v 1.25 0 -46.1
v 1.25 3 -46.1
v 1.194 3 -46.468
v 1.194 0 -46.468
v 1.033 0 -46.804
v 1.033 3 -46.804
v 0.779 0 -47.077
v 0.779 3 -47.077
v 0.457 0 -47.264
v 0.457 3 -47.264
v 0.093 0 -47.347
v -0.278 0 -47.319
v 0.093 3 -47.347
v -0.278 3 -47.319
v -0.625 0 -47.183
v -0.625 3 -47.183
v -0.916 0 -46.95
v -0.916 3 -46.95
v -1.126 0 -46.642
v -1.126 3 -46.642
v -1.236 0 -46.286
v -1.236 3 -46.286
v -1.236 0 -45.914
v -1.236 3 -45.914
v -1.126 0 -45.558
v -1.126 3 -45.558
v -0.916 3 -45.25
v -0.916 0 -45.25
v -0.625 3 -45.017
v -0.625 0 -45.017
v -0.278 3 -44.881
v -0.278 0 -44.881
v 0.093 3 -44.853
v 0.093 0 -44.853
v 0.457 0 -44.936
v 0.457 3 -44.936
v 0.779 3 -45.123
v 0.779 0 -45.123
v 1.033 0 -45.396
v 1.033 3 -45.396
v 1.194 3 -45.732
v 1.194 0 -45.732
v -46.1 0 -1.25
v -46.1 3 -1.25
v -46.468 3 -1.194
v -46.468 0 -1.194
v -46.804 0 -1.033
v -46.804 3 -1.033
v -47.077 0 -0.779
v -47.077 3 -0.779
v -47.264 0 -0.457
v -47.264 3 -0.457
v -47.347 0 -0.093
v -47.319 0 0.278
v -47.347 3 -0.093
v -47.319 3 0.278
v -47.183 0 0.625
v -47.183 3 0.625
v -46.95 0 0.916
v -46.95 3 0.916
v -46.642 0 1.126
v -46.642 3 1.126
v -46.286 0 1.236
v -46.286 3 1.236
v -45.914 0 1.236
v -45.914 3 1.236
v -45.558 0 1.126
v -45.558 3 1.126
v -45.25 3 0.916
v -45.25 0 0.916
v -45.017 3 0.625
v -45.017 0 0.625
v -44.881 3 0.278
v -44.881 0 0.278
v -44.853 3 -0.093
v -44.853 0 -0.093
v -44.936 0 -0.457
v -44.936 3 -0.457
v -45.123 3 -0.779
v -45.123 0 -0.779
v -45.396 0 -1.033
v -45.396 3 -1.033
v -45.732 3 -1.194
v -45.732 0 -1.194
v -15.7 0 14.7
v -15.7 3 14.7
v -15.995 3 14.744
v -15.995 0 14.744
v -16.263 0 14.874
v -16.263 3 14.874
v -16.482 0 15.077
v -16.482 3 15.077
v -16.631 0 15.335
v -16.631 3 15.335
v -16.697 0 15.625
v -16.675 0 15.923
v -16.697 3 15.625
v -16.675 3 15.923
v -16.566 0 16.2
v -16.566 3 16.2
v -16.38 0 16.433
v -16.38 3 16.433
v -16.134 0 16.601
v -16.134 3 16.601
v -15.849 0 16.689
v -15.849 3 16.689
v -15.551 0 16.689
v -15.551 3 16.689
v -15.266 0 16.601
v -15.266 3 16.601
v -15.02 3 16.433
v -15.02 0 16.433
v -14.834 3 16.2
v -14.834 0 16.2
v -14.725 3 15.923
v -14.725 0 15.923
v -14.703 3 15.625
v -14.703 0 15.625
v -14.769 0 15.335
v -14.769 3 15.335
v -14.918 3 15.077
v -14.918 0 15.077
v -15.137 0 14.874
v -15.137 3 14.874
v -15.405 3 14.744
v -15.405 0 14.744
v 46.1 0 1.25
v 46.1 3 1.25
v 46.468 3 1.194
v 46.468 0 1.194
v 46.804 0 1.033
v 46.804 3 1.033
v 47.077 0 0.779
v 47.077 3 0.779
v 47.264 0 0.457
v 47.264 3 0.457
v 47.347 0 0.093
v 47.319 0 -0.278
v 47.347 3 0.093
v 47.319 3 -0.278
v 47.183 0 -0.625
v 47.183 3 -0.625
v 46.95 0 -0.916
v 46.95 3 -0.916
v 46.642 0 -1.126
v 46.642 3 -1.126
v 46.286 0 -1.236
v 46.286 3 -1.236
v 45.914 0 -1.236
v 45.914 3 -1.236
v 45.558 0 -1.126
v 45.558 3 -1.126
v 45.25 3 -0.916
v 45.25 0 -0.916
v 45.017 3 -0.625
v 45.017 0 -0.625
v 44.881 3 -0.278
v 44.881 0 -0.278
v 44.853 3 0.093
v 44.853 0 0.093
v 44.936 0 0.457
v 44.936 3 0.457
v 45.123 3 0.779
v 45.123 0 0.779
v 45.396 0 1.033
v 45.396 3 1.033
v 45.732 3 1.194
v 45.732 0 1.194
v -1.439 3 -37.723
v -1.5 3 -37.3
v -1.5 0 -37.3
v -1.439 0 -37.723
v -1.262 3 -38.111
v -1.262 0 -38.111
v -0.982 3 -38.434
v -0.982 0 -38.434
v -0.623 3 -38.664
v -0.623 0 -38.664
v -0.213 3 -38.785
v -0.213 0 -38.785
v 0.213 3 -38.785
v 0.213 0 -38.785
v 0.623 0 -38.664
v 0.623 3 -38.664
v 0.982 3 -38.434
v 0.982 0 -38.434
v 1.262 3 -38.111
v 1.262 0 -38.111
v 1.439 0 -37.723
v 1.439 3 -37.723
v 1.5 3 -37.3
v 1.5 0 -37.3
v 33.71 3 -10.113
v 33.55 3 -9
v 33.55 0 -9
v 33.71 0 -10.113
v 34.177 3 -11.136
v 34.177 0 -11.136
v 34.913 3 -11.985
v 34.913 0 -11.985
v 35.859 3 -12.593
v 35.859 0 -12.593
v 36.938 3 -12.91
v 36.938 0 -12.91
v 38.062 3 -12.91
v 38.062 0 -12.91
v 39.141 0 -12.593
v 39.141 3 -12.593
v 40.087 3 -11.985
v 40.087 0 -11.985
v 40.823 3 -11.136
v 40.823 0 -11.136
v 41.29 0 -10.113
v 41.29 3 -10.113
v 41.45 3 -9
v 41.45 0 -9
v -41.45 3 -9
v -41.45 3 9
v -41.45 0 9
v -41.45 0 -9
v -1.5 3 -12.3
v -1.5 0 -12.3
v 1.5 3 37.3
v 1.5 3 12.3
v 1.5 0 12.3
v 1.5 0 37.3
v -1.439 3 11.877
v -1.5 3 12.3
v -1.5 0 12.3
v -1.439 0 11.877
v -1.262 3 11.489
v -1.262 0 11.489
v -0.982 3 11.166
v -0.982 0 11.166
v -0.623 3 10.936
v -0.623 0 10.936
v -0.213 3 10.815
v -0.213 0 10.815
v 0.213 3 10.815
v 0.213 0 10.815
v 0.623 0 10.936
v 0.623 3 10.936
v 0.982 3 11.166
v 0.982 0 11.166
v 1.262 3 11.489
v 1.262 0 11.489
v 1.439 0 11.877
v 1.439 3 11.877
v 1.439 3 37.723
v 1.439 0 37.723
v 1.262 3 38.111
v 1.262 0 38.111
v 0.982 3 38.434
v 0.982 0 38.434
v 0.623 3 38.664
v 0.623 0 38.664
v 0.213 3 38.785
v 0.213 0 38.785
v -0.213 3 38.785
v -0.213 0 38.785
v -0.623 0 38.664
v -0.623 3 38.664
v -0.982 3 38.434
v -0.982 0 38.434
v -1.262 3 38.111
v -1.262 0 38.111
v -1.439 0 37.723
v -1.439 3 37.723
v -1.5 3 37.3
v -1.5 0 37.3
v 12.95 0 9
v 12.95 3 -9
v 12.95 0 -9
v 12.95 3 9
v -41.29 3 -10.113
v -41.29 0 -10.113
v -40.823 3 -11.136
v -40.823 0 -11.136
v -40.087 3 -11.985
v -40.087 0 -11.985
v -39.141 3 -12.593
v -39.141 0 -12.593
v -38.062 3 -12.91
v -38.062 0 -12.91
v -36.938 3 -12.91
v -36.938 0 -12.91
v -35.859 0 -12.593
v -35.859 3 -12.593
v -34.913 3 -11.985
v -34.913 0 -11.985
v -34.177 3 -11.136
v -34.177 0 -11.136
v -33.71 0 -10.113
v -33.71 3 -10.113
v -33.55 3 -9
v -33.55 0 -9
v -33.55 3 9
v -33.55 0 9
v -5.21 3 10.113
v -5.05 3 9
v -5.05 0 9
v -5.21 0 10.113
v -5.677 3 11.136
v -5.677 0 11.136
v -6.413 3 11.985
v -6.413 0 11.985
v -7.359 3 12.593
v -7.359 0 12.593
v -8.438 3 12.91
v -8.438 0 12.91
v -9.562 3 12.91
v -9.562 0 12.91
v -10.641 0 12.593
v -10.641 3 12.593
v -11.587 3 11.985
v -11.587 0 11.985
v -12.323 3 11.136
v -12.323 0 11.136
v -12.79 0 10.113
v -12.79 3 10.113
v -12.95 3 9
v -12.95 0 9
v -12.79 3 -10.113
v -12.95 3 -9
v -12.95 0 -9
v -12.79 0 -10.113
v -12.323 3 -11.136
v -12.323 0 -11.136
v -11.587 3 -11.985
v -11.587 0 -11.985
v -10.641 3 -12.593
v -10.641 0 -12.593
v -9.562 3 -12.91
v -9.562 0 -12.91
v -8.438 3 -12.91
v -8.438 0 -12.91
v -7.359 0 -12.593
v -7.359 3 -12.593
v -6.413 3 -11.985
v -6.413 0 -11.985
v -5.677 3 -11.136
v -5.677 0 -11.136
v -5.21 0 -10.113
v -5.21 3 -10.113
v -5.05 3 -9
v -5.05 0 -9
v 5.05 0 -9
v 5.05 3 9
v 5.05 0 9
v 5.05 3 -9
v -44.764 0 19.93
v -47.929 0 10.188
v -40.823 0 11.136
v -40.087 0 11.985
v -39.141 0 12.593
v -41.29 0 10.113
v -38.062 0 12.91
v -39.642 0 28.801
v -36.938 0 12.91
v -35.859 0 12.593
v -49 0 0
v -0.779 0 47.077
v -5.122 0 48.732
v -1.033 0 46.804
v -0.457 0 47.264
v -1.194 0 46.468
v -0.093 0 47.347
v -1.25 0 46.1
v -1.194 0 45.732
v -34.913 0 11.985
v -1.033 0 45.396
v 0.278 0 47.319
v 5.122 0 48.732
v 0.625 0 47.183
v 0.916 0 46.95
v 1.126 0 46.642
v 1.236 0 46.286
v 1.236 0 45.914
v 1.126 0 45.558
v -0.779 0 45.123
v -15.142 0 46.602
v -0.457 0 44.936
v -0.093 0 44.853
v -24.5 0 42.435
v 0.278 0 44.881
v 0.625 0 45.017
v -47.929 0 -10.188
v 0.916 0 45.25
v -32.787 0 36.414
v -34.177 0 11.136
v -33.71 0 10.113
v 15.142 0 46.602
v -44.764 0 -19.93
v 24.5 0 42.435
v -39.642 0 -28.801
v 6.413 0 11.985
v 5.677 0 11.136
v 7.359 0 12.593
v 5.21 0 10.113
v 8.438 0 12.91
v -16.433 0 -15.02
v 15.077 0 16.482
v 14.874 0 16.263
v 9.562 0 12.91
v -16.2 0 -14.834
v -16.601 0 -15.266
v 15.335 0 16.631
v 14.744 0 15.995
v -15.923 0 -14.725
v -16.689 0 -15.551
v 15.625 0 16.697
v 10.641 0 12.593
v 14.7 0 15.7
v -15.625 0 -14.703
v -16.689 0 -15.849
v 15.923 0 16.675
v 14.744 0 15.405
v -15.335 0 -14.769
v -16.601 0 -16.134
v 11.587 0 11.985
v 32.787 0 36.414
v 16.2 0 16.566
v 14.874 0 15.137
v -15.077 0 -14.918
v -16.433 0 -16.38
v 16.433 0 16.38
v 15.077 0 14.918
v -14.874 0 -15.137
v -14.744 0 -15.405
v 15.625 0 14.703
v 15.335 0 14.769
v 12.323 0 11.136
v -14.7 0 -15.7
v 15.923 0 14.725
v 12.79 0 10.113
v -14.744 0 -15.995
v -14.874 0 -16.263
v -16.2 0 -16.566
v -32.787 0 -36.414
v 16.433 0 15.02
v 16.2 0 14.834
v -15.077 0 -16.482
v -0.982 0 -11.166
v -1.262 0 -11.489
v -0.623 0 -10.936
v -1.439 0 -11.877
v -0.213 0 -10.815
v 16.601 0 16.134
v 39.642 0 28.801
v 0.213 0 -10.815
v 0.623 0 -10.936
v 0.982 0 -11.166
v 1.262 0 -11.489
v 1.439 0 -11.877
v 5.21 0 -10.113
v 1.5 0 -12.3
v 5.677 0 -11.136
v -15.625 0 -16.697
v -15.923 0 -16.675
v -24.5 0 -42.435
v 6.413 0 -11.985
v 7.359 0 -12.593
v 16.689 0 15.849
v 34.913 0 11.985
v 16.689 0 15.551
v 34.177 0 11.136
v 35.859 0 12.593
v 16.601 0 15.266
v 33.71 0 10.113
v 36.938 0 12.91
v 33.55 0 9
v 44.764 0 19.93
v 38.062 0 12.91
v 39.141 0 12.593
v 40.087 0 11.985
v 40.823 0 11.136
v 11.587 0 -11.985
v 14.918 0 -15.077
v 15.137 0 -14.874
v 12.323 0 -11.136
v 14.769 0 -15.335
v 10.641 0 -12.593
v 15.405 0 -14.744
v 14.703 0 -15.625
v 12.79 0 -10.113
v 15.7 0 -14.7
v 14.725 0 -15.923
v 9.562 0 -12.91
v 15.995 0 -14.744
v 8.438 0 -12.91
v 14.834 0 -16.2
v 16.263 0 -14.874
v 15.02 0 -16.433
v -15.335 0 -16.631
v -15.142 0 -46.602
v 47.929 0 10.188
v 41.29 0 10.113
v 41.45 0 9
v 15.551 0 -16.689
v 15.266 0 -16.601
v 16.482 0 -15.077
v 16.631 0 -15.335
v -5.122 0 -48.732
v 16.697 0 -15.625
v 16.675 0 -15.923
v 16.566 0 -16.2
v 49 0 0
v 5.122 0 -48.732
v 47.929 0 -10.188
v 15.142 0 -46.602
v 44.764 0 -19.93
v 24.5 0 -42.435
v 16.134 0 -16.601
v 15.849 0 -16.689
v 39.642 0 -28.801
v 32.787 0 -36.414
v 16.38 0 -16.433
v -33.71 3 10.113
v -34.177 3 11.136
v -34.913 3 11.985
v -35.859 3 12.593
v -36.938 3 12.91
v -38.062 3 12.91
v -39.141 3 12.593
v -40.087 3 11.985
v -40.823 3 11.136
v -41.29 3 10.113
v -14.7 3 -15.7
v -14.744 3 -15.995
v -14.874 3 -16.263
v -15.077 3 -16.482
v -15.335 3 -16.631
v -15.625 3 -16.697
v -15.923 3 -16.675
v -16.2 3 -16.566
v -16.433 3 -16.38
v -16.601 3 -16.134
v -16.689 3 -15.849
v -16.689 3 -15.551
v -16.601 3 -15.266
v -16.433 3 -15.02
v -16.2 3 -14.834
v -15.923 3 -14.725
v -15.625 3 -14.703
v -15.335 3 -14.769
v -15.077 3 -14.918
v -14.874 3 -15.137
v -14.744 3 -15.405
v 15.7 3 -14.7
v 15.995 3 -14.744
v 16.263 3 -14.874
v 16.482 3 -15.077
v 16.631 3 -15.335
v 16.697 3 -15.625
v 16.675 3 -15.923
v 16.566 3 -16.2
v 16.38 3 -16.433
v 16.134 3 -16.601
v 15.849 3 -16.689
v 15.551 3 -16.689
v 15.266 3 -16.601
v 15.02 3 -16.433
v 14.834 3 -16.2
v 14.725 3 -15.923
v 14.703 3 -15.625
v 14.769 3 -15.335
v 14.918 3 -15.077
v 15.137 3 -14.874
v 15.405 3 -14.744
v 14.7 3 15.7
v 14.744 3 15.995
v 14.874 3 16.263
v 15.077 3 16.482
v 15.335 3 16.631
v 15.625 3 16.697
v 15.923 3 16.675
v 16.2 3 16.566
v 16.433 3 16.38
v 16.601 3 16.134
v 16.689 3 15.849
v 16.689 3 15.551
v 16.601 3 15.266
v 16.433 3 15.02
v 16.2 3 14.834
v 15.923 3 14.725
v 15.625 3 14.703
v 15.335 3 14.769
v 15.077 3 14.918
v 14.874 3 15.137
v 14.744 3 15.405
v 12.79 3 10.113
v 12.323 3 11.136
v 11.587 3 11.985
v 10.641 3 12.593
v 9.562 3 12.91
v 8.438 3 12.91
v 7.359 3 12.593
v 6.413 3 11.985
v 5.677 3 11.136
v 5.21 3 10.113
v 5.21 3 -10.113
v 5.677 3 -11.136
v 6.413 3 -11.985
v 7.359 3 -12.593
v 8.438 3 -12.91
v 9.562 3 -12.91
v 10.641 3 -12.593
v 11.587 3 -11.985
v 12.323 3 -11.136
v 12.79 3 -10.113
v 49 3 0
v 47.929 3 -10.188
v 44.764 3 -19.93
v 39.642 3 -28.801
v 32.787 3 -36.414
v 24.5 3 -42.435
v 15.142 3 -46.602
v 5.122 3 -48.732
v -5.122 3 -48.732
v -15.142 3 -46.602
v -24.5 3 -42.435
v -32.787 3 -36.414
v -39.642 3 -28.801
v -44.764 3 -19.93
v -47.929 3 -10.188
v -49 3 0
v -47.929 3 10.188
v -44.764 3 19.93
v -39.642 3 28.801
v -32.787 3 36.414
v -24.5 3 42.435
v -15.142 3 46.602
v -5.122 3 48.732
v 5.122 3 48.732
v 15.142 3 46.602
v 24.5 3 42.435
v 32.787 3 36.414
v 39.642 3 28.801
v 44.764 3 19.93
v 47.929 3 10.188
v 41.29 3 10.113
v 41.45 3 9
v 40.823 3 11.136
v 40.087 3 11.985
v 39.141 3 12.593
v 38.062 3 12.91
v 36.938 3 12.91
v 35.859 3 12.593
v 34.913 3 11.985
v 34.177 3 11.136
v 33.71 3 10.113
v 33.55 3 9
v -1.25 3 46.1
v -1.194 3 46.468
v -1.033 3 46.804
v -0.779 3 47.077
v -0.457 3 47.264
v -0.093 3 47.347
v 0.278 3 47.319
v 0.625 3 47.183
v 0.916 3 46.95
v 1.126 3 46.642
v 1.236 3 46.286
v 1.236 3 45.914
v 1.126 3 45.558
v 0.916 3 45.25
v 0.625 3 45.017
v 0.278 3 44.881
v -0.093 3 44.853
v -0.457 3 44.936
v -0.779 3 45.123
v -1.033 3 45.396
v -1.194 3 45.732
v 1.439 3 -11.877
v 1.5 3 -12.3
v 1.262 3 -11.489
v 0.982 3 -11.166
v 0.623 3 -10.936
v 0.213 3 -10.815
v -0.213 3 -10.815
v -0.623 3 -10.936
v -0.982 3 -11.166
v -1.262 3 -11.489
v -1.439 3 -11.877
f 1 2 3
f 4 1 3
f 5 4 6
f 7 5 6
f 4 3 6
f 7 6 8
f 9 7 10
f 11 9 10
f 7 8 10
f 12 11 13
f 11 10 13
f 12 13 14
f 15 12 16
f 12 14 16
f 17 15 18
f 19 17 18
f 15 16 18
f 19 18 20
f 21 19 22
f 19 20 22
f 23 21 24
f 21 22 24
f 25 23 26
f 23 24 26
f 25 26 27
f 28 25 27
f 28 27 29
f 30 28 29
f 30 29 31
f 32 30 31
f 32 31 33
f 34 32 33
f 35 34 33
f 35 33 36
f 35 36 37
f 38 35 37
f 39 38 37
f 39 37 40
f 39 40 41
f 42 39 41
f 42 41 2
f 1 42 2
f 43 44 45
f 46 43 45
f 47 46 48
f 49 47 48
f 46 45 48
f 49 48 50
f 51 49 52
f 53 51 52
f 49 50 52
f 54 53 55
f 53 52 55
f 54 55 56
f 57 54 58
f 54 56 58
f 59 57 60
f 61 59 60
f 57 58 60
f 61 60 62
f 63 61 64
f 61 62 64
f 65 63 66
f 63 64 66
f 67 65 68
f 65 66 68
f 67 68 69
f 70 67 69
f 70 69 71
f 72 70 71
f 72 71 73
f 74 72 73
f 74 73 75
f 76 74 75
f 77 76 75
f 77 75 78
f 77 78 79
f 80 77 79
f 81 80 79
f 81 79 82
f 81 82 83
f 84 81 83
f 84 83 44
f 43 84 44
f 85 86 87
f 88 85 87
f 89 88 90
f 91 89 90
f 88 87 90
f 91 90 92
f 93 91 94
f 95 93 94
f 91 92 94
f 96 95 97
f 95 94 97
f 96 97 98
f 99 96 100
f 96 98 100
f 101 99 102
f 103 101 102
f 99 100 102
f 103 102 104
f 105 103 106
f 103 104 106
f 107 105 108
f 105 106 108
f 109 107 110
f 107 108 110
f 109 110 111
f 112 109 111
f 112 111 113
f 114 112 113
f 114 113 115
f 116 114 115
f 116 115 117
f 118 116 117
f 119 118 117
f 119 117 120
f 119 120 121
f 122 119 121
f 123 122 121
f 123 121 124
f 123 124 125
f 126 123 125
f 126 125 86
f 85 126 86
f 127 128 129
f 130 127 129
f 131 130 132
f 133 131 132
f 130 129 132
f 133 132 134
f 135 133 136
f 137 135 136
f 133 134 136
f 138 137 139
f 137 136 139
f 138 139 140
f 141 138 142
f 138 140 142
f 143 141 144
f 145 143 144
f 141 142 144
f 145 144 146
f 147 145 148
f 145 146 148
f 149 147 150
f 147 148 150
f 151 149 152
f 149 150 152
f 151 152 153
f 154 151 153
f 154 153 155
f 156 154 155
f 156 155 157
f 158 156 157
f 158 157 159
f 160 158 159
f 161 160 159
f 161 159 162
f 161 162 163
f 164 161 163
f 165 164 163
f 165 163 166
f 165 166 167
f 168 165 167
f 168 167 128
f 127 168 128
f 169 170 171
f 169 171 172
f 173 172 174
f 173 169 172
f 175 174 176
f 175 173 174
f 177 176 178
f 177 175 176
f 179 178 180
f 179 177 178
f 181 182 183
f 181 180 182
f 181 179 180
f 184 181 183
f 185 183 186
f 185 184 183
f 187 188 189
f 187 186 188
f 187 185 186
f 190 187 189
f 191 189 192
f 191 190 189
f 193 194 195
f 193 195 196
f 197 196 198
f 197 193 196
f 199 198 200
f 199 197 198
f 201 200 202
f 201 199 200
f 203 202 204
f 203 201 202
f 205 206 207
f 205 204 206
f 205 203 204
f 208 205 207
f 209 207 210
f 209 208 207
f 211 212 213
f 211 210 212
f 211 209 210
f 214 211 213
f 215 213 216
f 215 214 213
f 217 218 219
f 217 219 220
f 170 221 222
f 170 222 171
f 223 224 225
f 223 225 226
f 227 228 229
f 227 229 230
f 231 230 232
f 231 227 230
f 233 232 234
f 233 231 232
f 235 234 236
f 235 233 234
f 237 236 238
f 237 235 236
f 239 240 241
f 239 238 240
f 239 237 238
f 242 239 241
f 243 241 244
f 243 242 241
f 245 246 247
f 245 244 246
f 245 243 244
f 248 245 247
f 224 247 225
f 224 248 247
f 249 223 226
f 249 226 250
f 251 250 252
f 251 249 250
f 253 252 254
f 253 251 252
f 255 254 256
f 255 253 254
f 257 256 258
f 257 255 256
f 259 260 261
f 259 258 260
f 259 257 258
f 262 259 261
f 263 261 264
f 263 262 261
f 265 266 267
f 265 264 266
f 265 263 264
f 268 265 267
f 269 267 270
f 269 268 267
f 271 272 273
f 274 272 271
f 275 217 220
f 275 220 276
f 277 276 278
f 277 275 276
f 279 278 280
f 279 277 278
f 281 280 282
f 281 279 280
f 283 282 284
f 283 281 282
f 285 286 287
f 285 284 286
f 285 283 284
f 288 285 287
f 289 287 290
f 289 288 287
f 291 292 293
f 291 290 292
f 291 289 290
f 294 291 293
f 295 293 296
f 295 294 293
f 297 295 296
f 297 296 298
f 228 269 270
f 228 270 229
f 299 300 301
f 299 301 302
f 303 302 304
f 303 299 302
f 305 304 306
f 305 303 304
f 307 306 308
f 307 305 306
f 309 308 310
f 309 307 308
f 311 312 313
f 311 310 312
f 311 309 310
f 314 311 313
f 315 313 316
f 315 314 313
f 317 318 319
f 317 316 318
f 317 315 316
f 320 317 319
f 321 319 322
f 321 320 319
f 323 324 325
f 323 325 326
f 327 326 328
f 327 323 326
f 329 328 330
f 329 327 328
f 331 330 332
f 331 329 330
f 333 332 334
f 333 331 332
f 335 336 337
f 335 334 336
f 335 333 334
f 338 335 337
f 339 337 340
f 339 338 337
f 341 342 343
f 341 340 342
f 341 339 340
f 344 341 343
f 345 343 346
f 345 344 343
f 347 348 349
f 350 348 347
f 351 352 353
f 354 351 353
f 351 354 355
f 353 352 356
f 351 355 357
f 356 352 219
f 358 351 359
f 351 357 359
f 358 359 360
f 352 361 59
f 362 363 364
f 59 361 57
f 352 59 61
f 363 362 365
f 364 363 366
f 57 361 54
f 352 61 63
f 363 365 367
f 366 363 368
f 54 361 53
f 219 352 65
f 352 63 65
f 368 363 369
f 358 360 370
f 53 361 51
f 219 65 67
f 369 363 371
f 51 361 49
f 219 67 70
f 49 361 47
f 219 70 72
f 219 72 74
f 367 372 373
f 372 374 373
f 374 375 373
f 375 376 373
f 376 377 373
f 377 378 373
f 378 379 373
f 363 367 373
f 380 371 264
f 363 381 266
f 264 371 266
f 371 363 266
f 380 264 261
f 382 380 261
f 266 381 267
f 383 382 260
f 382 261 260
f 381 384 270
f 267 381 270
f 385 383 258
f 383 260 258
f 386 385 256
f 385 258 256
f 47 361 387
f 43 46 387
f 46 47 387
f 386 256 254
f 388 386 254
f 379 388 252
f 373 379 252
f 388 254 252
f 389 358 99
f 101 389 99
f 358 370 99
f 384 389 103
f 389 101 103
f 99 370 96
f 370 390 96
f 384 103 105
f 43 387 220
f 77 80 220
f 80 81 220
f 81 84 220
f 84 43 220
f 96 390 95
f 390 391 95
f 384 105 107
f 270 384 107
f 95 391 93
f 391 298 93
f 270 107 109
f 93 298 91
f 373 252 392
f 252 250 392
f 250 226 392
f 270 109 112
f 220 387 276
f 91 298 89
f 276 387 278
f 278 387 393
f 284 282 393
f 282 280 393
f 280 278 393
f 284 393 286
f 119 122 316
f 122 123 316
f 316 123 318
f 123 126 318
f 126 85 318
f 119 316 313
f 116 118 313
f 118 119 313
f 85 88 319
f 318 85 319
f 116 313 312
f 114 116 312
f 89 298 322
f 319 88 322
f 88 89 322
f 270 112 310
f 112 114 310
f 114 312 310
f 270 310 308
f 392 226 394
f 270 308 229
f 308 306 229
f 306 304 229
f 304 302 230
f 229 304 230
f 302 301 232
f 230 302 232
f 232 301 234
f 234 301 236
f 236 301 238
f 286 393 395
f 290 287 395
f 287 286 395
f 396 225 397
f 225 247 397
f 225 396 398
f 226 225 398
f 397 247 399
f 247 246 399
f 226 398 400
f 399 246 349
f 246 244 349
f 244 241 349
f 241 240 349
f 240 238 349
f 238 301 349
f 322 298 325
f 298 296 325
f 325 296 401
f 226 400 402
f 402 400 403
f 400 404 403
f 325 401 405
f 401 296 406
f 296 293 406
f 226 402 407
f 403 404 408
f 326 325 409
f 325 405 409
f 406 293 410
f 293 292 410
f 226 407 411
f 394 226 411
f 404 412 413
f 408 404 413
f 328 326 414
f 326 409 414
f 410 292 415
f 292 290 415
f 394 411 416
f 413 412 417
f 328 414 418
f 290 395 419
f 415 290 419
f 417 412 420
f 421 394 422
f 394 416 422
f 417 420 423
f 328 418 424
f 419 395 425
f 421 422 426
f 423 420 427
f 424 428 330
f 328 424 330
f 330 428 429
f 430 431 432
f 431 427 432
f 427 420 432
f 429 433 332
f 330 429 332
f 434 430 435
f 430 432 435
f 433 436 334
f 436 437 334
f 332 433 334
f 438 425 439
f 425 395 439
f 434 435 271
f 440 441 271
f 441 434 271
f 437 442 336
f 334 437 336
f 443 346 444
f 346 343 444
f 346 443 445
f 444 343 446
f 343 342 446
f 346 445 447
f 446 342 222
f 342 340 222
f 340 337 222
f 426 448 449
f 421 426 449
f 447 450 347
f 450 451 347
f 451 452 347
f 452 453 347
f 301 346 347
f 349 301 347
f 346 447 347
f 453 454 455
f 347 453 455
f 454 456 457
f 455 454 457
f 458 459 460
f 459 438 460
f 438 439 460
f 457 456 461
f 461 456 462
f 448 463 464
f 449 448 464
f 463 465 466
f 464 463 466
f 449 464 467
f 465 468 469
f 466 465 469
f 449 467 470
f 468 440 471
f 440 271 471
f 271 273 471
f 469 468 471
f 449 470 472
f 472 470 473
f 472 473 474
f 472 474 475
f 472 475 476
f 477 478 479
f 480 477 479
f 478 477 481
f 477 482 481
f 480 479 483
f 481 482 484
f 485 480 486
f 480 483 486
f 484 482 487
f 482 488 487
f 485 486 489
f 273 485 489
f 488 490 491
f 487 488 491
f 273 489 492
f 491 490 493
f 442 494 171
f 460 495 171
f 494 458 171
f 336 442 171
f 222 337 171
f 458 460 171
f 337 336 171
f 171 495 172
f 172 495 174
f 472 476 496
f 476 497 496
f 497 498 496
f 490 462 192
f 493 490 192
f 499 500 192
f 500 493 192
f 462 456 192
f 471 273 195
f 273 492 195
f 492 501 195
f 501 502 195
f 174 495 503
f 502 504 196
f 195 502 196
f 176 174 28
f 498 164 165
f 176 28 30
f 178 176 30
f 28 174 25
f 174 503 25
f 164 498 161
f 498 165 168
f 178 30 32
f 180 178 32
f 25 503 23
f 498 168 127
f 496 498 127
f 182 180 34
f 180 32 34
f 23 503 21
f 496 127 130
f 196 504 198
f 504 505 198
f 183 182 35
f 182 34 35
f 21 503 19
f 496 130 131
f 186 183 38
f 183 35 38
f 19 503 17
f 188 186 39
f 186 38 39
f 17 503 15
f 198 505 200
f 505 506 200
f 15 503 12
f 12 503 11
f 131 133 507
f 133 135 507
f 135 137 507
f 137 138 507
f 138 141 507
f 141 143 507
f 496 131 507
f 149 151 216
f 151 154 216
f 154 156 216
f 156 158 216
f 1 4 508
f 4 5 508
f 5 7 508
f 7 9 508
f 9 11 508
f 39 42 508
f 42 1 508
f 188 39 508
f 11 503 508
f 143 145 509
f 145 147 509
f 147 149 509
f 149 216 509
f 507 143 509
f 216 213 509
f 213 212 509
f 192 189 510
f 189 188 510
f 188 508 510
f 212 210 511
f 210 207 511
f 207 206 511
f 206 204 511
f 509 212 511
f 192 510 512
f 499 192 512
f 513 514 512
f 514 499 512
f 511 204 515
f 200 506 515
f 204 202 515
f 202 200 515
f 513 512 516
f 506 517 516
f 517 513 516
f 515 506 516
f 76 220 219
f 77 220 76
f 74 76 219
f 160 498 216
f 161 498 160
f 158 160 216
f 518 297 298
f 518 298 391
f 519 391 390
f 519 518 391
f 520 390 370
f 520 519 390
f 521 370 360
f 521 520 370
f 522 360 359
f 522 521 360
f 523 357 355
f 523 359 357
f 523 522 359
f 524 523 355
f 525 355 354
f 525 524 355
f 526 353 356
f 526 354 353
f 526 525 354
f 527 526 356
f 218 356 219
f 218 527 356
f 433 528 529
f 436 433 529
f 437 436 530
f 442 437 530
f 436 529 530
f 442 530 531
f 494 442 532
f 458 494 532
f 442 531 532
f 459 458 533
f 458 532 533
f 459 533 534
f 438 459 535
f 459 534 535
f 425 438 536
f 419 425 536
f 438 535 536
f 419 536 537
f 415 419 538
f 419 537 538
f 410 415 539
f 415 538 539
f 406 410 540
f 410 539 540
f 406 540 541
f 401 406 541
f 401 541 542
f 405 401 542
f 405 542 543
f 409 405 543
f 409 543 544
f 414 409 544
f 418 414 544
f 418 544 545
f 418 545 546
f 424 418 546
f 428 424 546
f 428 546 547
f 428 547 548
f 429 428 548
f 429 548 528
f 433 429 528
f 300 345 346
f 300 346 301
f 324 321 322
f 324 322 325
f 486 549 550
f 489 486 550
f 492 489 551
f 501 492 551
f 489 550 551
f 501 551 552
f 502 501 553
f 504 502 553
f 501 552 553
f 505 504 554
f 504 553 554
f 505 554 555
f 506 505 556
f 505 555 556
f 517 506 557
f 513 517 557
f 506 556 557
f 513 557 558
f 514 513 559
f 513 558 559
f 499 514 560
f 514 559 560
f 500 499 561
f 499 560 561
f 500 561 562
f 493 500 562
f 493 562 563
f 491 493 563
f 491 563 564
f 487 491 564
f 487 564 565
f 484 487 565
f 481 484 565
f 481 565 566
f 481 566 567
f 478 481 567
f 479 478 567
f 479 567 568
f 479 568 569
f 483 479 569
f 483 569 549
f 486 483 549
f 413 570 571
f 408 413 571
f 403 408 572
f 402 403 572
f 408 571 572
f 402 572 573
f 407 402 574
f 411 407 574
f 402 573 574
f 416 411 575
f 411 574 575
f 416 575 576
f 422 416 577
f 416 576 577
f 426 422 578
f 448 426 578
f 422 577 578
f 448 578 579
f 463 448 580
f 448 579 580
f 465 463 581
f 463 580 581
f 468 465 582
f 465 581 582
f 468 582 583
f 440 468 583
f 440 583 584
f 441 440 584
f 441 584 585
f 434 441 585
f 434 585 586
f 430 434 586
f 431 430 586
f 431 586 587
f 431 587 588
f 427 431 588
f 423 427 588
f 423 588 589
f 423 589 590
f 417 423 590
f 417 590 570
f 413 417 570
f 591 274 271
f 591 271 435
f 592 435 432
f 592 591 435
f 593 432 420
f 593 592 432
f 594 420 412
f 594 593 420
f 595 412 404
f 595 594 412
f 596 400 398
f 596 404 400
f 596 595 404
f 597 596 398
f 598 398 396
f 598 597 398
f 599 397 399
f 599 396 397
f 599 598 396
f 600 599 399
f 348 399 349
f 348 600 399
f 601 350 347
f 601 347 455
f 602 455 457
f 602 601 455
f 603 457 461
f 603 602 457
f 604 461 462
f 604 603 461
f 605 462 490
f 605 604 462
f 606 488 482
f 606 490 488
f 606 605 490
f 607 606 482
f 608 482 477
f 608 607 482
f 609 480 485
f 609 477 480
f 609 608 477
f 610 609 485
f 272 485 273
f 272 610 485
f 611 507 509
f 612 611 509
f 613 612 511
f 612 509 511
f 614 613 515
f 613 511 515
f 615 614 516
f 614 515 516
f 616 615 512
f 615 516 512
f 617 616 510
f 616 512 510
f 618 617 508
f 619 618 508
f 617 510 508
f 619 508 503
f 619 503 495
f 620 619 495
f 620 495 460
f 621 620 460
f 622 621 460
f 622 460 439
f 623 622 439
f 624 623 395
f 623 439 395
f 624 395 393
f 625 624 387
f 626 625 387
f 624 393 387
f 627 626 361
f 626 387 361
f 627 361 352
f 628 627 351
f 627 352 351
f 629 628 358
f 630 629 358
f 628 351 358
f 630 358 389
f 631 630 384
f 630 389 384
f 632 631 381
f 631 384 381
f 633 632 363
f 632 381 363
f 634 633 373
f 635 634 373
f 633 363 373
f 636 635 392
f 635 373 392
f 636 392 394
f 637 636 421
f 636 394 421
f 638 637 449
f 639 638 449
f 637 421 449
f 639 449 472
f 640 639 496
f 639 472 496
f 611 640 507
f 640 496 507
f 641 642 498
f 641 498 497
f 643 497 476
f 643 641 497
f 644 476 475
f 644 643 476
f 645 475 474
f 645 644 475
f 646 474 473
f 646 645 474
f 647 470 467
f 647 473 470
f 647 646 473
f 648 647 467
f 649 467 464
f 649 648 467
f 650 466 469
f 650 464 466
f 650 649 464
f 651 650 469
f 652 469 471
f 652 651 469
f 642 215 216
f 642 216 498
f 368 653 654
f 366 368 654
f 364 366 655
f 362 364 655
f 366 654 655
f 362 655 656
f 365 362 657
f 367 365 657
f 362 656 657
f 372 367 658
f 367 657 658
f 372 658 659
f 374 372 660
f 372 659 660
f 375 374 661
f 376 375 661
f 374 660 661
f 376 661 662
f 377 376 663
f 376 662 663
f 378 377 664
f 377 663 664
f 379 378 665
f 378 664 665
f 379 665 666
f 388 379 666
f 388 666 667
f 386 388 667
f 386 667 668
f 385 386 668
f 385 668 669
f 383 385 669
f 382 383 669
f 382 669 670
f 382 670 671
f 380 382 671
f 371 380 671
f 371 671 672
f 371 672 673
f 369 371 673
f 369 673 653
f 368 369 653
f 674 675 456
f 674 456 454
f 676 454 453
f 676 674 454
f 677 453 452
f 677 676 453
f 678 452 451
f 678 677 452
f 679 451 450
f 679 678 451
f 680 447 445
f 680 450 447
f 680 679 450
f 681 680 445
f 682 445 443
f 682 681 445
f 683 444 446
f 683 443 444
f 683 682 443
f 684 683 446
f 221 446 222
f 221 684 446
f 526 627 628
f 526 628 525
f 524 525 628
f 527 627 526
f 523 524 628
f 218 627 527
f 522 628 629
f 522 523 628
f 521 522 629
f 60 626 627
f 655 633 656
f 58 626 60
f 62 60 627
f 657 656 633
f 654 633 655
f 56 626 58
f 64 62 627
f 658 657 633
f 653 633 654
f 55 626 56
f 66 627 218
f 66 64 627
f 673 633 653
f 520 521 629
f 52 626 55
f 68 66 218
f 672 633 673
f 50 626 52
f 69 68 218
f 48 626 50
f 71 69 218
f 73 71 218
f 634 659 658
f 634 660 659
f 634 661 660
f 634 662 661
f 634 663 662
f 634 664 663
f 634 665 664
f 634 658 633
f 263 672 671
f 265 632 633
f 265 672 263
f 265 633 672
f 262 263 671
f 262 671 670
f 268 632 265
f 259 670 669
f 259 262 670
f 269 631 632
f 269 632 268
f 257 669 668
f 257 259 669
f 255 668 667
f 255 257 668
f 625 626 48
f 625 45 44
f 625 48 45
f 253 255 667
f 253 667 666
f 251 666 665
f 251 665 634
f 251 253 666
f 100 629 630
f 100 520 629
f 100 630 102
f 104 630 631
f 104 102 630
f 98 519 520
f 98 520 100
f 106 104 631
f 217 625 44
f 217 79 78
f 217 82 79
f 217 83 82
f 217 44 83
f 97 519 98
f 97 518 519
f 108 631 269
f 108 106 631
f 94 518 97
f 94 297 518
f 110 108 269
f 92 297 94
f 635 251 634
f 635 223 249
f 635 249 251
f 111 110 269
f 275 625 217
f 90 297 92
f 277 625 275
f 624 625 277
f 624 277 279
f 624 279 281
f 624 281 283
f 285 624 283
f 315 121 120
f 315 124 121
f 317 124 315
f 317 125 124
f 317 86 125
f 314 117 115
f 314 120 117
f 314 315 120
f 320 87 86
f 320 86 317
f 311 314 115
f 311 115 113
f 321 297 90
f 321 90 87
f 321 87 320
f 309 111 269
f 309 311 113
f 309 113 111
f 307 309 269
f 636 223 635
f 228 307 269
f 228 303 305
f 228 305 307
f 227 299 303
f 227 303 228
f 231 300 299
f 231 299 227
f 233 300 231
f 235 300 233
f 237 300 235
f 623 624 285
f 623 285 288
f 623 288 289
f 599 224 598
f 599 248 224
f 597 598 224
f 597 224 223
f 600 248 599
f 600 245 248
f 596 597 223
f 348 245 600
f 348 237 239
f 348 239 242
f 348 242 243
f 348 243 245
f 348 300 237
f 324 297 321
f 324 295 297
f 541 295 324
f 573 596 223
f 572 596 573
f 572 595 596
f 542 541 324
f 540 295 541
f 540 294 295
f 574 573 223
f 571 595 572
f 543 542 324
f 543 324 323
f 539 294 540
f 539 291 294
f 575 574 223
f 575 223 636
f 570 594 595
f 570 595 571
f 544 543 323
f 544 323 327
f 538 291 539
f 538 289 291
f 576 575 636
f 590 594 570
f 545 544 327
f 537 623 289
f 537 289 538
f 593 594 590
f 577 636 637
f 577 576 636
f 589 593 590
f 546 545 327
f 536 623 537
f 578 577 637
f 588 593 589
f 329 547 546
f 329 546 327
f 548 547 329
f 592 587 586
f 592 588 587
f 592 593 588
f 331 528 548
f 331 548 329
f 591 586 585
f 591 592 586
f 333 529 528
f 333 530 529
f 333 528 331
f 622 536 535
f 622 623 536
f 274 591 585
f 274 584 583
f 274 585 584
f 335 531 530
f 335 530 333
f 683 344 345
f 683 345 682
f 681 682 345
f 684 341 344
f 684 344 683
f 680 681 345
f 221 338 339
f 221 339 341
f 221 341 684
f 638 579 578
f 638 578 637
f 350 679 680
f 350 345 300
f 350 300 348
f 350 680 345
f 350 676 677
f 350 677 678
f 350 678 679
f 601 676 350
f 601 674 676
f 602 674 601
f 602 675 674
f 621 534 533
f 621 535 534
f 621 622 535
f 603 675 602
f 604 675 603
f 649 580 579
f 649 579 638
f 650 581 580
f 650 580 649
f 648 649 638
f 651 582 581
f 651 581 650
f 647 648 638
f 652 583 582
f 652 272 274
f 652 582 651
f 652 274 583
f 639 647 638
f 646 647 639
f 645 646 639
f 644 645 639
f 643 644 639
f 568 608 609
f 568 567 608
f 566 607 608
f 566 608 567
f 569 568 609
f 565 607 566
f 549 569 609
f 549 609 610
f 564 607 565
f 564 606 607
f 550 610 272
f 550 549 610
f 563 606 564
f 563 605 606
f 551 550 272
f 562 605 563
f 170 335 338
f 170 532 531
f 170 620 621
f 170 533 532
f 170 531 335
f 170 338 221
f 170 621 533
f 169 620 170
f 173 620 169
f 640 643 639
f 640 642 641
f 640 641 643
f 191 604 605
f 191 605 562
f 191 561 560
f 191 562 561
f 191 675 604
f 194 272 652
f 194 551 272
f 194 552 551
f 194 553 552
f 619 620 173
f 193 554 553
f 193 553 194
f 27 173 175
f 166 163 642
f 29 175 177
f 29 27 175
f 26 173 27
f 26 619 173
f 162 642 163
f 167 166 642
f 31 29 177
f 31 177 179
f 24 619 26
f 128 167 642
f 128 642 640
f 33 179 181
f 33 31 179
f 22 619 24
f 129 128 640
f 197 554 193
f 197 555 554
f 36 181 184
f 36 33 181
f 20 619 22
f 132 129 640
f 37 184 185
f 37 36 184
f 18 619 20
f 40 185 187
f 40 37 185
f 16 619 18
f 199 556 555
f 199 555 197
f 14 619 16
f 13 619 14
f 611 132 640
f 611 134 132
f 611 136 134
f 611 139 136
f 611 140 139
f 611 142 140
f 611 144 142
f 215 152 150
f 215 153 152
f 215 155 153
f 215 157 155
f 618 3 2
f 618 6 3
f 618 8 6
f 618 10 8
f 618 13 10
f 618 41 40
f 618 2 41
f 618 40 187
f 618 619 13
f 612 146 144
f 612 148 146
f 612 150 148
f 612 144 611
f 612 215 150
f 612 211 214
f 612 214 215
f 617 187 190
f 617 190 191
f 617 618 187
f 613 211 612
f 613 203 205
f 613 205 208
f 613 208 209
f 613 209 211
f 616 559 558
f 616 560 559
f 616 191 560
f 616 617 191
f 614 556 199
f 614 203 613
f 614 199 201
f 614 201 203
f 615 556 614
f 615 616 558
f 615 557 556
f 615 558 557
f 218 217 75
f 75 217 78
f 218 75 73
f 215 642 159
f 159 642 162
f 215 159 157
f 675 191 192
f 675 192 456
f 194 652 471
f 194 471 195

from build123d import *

# Parameters (mm, degrees)
SKETCH_1_R                      = 49
EXTRUDE_1_DEPTH                 = 3
CUT_EXTRUDE_1_DEPTH             = 4
PATTERN_CIRCULAR_2_COUNT        = 2
CUT_EXTRUDE_3_DEPTH             = 4
PATTERN_LINEAR_1_COUNT          = 2
PATTERN_LINEAR_1_PITCH          = 28.5
PATTERN_CIRCULAR_5_COUNT        = 2
PATTERN_CIRCULAR_5_COPY_1_DEPTH = 4
SKETCH_14_R                     = 1.25
CUT_EXTRUDE_4_DEPTH             = 4
PATTERN_CIRCULAR_6_COUNT        = 4
SKETCH_8_R                      = 1
CUT_EXTRUDE_5_DEPTH             = 4
PATTERN_CIRCULAR_7_COUNT        = 4


with BuildPart() as part:
    # 草图1 → 凸台-拉伸1 (new body)
    with BuildSketch(Plane(origin=(0, 0, 0), x_dir=(1, 0, 0), z_dir=(0, 1, 0))):
        Circle(SKETCH_1_R)
    extrude(amount=EXTRUDE_1_DEPTH)

    # 草图6 → 切除-拉伸1 (cut, through all)
    with BuildSketch(Plane(origin=(0, 3, 0), x_dir=(1, 0, 0), z_dir=(0, 1, 0))):
        with BuildLine():
            Line((-1.5, 12.3), (-1.5, 37.3))
            ThreePointArc((-1.5, 37.3), (0, 38.8), (1.5, 37.3))
            Line((1.5, 37.3), (1.5, 12.3))
            ThreePointArc((1.5, 12.3), (0, 10.8), (-1.5, 12.3))
        make_face()
    cut_extrude_1 = extrude(amount=-CUT_EXTRUDE_1_DEPTH, mode=Mode.SUBTRACT)

    # 阵列(圆周)2: 切除-拉伸1 ×2 about axis
    pattern_circular_2_axis = Axis((0, 0, 0), (0, 1, 0))
    for i in range(1, PATTERN_CIRCULAR_2_COUNT):
        add(cut_extrude_1.rotate(pattern_circular_2_axis, i * 360 / PATTERN_CIRCULAR_2_COUNT), mode=Mode.SUBTRACT)

    # 草图9 → 切除-拉伸3 (cut, through all)
    with BuildSketch(Plane(origin=(0, 3, 0), x_dir=(1, 0, 0), z_dir=(0, 1, 0))):
        with BuildLine():
            Line((-12.95, -9), (-12.95, 9))
            ThreePointArc((-12.95, 9), (-9, 12.95), (-5.05, 9))
            Line((-5.05, 9), (-5.05, -9))
            ThreePointArc((-5.05, -9), (-9, -12.95), (-12.95, -9))
        make_face()
    cut_extrude_3 = extrude(amount=-CUT_EXTRUDE_3_DEPTH, mode=Mode.SUBTRACT)

    # 阵列(线性)1: 切除-拉伸3 ×2
    with Locations(*[(-i * PATTERN_LINEAR_1_PITCH, 0, 0) for i in range(1, PATTERN_LINEAR_1_COUNT)]):
        add(cut_extrude_3, mode=Mode.SUBTRACT)

    # 阵列(圆周)5: 切除-拉伸3 ×2 about axis
    pattern_circular_5_axis = Axis((0, 0, 0), (0, 1, 0))
    for i in range(1, PATTERN_CIRCULAR_5_COUNT):
        add(cut_extrude_3.rotate(pattern_circular_5_axis, i * 360 / PATTERN_CIRCULAR_5_COUNT), mode=Mode.SUBTRACT)

    # 阵列(圆周)5 copy 1 sketch → 阵列(圆周)5 copy 1 (cut, through all)
    with BuildSketch(Plane(origin=(28.5, 3, 0), x_dir=(-1, 0, 0), z_dir=(0, 1, 0))):
        with BuildLine():
            Line((-12.95, -9), (-12.95, 9))
            ThreePointArc((-12.95, 9), (-9, 12.95), (-5.05, 9))
            Line((-5.05, 9), (-5.05, -9))
            ThreePointArc((-5.05, -9), (-9, -12.95), (-12.95, -9))
        make_face()
    extrude(amount=-PATTERN_CIRCULAR_5_COPY_1_DEPTH, mode=Mode.SUBTRACT)

    # 草图14 → 切除-拉伸4 (cut, through all)
    with BuildSketch(Plane(origin=(0, 3, 0), x_dir=(1, 0, 0), z_dir=(0, 1, 0))):
        with Locations((0, 46.1)):
            Circle(SKETCH_14_R)
    cut_extrude_4 = extrude(amount=-CUT_EXTRUDE_4_DEPTH, mode=Mode.SUBTRACT)

    # 阵列(圆周)6: 切除-拉伸4 ×4 about axis
    pattern_circular_6_axis = Axis((0, 0, 0), (0, 1, 0))
    for i in range(1, PATTERN_CIRCULAR_6_COUNT):
        add(cut_extrude_4.rotate(pattern_circular_6_axis, i * 360 / PATTERN_CIRCULAR_6_COUNT), mode=Mode.SUBTRACT)

    # 草图8 → 切除-拉伸5 (cut, through all)
    with BuildSketch(Plane(origin=(0, 3, 0), x_dir=(1, 0, 0), z_dir=(0, 1, 0))):
        with Locations((-15.7, 15.7)):
            Circle(SKETCH_8_R)
    cut_extrude_5 = extrude(amount=-CUT_EXTRUDE_5_DEPTH, mode=Mode.SUBTRACT)

    # 阵列(圆周)7: 切除-拉伸5 ×4 about axis
    pattern_circular_7_axis = Axis((0, 0, 0), (0, 1, 0))
    for i in range(1, PATTERN_CIRCULAR_7_COUNT):
        add(cut_extrude_5.rotate(pattern_circular_7_axis, i * 360 / PATTERN_CIRCULAR_7_COUNT), mode=Mode.SUBTRACT)


solid = part.part
